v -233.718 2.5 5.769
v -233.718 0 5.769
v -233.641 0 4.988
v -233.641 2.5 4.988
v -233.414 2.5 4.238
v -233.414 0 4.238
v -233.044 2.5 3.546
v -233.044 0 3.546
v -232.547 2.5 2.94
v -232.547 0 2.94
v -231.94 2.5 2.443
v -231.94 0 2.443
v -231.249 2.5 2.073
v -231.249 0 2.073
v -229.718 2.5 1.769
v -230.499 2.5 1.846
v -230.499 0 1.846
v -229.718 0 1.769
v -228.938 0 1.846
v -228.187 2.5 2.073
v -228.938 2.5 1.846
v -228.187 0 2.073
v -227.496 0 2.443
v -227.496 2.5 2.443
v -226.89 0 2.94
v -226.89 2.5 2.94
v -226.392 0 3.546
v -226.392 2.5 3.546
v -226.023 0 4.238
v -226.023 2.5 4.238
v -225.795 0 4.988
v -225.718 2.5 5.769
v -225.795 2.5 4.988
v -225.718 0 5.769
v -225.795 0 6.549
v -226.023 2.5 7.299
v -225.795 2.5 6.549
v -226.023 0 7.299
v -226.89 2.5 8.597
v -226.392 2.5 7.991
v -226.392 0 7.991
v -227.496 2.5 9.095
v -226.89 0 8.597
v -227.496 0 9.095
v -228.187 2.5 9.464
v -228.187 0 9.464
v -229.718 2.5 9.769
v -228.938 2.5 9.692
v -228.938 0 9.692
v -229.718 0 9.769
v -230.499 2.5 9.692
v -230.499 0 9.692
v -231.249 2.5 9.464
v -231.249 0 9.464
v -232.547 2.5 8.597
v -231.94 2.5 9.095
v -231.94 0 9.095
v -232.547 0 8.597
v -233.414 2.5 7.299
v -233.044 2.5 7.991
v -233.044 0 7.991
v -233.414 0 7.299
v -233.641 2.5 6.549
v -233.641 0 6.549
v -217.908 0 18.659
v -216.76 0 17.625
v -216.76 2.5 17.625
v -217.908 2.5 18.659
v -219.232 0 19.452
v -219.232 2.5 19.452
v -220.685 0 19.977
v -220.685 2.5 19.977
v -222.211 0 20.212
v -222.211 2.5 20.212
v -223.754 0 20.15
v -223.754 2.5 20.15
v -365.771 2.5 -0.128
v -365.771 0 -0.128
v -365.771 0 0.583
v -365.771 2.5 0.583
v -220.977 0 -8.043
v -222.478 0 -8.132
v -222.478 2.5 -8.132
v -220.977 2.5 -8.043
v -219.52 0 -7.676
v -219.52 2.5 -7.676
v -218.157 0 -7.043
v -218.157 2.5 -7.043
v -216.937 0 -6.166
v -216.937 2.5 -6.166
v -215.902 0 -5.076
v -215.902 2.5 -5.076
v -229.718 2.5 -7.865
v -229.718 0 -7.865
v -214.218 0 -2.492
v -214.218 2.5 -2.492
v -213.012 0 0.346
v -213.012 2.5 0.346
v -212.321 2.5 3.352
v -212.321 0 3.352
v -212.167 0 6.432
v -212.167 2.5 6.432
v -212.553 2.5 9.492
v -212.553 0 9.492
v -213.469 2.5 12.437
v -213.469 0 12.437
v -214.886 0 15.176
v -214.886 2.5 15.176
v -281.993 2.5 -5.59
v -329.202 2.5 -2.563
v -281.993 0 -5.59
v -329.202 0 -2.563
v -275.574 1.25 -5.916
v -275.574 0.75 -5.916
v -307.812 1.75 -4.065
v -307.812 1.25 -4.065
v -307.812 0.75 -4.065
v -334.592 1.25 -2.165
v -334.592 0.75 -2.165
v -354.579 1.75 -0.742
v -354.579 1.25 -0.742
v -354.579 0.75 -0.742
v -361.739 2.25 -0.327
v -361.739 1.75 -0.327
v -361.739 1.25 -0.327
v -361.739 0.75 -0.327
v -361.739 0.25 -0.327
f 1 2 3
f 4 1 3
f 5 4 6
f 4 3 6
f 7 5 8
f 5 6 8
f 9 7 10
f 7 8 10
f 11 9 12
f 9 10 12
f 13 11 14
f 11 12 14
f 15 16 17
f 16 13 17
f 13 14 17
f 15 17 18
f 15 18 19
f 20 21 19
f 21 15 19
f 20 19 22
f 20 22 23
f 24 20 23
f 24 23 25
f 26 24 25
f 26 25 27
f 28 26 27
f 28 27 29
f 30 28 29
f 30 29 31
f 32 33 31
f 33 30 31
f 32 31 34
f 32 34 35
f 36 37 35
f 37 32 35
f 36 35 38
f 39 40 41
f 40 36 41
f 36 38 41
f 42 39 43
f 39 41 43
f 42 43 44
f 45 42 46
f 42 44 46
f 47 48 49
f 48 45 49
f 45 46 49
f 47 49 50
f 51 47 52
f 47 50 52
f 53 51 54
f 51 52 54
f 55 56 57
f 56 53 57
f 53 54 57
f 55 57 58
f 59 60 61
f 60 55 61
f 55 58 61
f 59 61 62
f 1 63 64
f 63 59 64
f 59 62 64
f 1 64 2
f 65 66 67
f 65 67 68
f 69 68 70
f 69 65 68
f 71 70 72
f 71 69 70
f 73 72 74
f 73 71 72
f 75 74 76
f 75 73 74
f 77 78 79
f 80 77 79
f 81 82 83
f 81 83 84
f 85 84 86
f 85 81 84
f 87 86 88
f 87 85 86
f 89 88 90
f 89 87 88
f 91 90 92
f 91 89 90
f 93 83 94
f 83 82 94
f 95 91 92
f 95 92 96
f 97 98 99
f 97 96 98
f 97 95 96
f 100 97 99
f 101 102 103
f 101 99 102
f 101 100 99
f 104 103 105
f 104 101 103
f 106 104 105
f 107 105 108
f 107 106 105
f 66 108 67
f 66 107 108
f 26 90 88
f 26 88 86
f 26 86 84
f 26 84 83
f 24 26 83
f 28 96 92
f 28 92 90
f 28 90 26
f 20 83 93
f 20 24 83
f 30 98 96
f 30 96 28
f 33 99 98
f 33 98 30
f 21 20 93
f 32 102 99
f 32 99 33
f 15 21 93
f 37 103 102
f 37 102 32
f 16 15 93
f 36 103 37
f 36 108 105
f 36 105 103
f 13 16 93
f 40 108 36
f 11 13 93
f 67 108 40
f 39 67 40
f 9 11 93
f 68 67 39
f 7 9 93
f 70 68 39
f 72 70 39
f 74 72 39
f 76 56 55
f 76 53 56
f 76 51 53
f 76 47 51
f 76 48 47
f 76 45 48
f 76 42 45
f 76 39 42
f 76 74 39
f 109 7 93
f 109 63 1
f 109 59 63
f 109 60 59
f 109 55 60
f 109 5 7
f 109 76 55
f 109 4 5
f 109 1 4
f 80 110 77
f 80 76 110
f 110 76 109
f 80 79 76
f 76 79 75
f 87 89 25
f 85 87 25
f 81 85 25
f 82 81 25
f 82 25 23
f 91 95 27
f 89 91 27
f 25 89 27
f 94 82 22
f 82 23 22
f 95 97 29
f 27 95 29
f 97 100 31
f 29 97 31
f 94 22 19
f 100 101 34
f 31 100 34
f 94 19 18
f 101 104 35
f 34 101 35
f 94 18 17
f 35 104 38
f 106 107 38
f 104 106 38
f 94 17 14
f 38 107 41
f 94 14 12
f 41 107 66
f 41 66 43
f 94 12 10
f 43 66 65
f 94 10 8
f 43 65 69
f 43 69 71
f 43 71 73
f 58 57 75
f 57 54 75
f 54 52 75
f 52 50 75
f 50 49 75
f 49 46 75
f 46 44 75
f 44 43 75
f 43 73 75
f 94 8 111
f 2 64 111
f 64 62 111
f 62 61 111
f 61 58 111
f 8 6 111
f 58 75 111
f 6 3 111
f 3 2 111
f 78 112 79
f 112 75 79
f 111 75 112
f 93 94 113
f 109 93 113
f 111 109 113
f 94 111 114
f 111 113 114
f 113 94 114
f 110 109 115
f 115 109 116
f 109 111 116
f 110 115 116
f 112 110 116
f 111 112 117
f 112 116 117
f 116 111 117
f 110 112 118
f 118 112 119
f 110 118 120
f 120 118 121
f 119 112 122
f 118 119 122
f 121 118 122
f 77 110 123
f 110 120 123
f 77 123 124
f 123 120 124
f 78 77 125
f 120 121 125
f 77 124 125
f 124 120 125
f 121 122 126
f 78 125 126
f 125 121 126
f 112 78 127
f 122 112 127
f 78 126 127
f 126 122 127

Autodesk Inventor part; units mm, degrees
ref_plane "YZ Plane" through (0, 0, 0) normal (1, 0, 0) x (0, 1, 0)
ref_plane "XZ Plane" through (0, 0, 0) normal (0, 1, 0) x (-1, 0, 0)
ref_plane "XY Plane" through (0, 0, 0) normal (0, 0, 1) x (1, 0, 0)
sketch "Sketch1" plane through (0, 0, 0) normal (0, 1, 0) x (-1, 0, 0)
  arc A0 (210.1622, -7.2025) -> (309.6615, 148.1866) centre (370, 0) ccw construction
  line L0 (370, 0) -> (223.7542, 20.1499)
  circle A1 centre (211.4974, 21.8387) radius 160 construction
  circle A2 centre (369.9872, 0.0018) radius 3 construction
  line L1 (365.7713, 2.7478) -> (370.7713, 2.7478)
  line L2 (370.7713, 2.7478) -> (370.7713, -2.2522)
  line L3 (370.7713, -2.2522) -> (365.7713, -2.2522)
  line L4 (365.7713, -2.2522) -> (365.7713, 2.7478)
  arc A3 (216.7601, 17.6252) -> (215.9023, -5.0762) centre (229.7182, 5.7687) ccw
  circle A4 centre (229.7182, 5.7687) radius 11.5
  circle A5 centre (229.7182, 5.7687) radius 4
  spline S0 degree 4 poles (229.7182, -7.8653) (241.4545, -7.4272) (257.5169, -6.7771) (277.3318, -5.8971) (299.9482, -4.5961) (314.7433, -3.6129) (328.1612, -2.6484) (339.8268, -1.769) (350.012, -1.0496) (357.5866, -0.5225) (364.806, -0.1794) (367.4848, -0.031) (370.1657, -0.0078) (369.9872, 0.0018) knots 0 0 0 0 0 0.270374 0.37387 0.473524 0.56865 0.658428 0.741816 0.817434 0.88334 0.936143 1 1 1 1 1
  arc A6 (223.7542, 20.1499) -> (216.7601, 17.6252) centre (222.6622, 12.2248) ccw
  arc A7 (215.9023, -5.0762) -> (222.4776, -8.1316) centre (222.1952, -0.1366) ccw
  line L5 (222.4776, -8.1316) -> (229.7182, -7.8653)
  point P0 (370, 0)
  point P1 (210.0997, -8.5616)
  point P2 (267.1071, -6.3194)
  point P3 (284.4371, -5.4606)
  point P4 (300.619, -4.5258)
  point P5 (315.5184, -3.5432)
  point P6 (328.988, -2.5786)
  point P7 (340.8625, -1.7041)
  point P8 (350.9622, -0.9861)
  point P9 (359.0984, -0.4682)
  point P10 (365.0855, -0.1602)
  point P11 (368.7597, -0.0285)
  point P12 (368.4073, 0.2194)
  point P13 (365.7713, 0.5826)
  point P14 (220.3414, 20.6201)
  point P15 (365.7713, -0.1283)
  dimension "d5" = 160
  dimension "d25" = 6
  dimension "d26" = 5
  dimension "d27" = 5
  dimension "d41" = 23
  dimension "d60" = 8
  dimension "d65" = 8
extrude "Extrusion4" add sketch "Sketch1" along normal blind 2.5 contours S0 L5 A7 A3 A6 L0 L4 | A4
properties part number "airfoil blueprint"
